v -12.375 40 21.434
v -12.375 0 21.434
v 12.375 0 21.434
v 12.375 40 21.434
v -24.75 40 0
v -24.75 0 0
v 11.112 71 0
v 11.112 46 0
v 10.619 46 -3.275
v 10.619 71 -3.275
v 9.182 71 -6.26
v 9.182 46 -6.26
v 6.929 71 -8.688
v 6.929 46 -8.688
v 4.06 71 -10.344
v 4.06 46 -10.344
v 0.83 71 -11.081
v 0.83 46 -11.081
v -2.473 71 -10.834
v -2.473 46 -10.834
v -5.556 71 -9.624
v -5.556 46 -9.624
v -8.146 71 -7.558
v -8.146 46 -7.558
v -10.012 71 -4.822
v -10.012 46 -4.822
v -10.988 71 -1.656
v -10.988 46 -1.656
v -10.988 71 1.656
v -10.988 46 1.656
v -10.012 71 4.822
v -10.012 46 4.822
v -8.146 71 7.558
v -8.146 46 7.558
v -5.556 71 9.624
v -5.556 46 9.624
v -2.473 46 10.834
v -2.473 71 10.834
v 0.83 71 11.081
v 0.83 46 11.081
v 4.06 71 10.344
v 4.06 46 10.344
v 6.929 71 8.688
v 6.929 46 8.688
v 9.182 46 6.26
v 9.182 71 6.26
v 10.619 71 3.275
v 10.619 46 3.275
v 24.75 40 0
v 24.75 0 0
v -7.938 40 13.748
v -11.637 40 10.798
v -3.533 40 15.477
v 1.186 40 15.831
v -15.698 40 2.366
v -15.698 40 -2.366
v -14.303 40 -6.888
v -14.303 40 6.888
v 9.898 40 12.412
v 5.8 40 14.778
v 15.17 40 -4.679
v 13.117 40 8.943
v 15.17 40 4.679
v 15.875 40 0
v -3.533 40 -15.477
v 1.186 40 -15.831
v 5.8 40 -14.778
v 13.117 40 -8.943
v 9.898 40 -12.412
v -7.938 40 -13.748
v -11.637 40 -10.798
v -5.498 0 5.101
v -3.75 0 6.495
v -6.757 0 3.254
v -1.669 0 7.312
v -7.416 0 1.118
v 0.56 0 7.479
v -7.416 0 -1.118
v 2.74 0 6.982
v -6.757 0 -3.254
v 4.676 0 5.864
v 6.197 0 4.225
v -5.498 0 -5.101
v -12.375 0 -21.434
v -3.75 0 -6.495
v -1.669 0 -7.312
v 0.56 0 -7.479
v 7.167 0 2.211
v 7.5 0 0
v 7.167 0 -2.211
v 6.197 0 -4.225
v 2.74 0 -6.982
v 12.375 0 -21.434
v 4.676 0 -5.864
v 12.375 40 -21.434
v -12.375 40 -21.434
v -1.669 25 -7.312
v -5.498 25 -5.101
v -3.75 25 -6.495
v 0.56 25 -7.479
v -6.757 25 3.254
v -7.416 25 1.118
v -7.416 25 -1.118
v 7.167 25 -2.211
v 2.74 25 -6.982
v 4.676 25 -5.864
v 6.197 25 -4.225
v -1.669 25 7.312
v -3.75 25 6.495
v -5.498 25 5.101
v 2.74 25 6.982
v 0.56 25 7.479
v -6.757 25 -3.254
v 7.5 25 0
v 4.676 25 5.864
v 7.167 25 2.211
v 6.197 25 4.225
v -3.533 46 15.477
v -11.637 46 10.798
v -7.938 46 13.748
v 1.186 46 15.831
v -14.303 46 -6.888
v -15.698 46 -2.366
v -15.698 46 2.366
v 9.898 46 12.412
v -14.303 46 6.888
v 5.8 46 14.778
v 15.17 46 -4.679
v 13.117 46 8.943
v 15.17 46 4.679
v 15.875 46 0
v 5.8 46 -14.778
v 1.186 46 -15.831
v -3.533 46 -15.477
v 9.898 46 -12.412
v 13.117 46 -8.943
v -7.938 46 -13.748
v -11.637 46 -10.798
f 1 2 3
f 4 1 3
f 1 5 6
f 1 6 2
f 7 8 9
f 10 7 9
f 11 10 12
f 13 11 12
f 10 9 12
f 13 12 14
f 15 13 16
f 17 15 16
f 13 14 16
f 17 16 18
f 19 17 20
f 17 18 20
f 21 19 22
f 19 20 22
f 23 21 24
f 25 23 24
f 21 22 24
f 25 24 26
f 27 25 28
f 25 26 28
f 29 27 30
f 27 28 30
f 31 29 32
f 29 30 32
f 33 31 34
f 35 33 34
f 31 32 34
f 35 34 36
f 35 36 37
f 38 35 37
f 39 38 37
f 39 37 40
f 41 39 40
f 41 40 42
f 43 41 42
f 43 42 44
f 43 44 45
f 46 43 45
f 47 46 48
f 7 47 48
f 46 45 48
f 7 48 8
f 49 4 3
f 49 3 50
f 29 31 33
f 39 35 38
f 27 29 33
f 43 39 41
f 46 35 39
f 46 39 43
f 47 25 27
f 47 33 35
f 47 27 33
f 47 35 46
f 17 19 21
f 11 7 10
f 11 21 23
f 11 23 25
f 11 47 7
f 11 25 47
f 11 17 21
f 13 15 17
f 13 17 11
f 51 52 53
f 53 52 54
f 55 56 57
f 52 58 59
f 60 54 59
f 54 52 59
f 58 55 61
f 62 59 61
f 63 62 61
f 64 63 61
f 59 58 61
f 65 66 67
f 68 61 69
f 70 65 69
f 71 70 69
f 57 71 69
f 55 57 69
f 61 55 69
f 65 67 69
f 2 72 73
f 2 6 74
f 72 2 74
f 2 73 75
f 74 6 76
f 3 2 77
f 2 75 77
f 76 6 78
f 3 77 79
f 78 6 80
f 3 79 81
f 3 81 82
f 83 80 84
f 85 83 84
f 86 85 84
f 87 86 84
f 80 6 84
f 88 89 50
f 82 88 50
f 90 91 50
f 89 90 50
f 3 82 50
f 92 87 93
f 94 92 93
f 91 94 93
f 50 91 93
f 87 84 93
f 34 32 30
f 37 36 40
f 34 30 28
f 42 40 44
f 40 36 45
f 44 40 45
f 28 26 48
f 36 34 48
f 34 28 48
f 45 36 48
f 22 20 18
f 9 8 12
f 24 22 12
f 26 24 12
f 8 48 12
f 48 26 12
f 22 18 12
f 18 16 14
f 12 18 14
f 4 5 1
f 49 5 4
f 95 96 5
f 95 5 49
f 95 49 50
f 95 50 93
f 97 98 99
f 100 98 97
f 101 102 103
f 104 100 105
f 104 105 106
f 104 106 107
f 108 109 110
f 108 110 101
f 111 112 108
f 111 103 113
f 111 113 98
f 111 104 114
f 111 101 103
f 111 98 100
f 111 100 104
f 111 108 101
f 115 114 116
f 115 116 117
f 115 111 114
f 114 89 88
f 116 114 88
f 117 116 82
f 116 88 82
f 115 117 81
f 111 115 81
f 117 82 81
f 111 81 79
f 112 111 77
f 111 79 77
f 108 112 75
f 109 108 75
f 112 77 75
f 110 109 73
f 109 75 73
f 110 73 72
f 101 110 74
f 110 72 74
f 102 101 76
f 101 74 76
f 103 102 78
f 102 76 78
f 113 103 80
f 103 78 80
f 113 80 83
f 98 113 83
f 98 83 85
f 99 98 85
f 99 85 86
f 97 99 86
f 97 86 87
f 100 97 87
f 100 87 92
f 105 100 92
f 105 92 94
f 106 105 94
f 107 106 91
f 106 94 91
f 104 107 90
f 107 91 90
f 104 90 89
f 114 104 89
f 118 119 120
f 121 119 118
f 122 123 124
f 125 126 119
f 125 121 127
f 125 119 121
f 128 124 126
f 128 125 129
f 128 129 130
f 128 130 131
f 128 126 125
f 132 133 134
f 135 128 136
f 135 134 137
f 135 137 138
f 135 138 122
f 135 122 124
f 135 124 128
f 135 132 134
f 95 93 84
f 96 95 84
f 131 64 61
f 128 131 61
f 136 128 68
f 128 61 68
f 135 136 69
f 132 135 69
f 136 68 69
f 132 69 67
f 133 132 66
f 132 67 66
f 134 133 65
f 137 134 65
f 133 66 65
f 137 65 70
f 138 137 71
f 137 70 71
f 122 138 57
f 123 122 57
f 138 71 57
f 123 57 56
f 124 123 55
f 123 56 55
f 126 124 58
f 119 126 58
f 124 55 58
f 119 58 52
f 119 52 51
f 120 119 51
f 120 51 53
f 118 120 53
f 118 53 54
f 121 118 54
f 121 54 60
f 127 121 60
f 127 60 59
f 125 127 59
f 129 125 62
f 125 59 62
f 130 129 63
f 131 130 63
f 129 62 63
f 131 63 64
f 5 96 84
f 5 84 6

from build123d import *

# Parameters (mm, degrees)
BOSS_EXTRUDE1_DEPTH = 40
SKETCH2_R           = 15.875
BOSS_EXTRUDE2_DEPTH = 6
SKETCH3_R           = 11.1125
BOSS_EXTRUDE3_DEPTH = 25
SKETCH4_R           = 7.5
CUT_EXTRUDE1_DEPTH  = 25


with BuildPart() as part:
    # Sketch1 → Boss-Extrude1 (new body)
    with BuildSketch(Plane(origin=(0, 0, 0), x_dir=(1, 0, 0), z_dir=(0, 1, 0))):
        Polygon((24.75, 0), (12.375, 21.434128744), (-12.375, 21.434128744), (-24.75, 0), (-12.375, -21.434128744), (12.375, -21.434128744), align=None)
    extrude(amount=BOSS_EXTRUDE1_DEPTH)

    # Sketch4 → Cut-Extrude1 (cut)
    with BuildSketch(Plane.XZ):
        Circle(SKETCH4_R)
    extrude(amount=-CUT_EXTRUDE1_DEPTH, mode=Mode.SUBTRACT)


with BuildPart() as body_2:
    # Sketch2 → Boss-Extrude2 (new body)
    with BuildSketch(Plane(origin=(0, 40, 0), x_dir=(1, 0, 0), z_dir=(0, 1, 0))):
        Circle(SKETCH2_R)
    extrude(amount=BOSS_EXTRUDE2_DEPTH)


with BuildPart() as body_3:
    # Sketch3 → Boss-Extrude3 (new body)
    with BuildSketch(Plane(origin=(0, 46, 0), x_dir=(1, 0, 0), z_dir=(0, 1, 0))):
        Circle(SKETCH3_R)
    extrude(amount=BOSS_EXTRUDE3_DEPTH)


solid = Compound([part.part, body_2.part, body_3.part])
